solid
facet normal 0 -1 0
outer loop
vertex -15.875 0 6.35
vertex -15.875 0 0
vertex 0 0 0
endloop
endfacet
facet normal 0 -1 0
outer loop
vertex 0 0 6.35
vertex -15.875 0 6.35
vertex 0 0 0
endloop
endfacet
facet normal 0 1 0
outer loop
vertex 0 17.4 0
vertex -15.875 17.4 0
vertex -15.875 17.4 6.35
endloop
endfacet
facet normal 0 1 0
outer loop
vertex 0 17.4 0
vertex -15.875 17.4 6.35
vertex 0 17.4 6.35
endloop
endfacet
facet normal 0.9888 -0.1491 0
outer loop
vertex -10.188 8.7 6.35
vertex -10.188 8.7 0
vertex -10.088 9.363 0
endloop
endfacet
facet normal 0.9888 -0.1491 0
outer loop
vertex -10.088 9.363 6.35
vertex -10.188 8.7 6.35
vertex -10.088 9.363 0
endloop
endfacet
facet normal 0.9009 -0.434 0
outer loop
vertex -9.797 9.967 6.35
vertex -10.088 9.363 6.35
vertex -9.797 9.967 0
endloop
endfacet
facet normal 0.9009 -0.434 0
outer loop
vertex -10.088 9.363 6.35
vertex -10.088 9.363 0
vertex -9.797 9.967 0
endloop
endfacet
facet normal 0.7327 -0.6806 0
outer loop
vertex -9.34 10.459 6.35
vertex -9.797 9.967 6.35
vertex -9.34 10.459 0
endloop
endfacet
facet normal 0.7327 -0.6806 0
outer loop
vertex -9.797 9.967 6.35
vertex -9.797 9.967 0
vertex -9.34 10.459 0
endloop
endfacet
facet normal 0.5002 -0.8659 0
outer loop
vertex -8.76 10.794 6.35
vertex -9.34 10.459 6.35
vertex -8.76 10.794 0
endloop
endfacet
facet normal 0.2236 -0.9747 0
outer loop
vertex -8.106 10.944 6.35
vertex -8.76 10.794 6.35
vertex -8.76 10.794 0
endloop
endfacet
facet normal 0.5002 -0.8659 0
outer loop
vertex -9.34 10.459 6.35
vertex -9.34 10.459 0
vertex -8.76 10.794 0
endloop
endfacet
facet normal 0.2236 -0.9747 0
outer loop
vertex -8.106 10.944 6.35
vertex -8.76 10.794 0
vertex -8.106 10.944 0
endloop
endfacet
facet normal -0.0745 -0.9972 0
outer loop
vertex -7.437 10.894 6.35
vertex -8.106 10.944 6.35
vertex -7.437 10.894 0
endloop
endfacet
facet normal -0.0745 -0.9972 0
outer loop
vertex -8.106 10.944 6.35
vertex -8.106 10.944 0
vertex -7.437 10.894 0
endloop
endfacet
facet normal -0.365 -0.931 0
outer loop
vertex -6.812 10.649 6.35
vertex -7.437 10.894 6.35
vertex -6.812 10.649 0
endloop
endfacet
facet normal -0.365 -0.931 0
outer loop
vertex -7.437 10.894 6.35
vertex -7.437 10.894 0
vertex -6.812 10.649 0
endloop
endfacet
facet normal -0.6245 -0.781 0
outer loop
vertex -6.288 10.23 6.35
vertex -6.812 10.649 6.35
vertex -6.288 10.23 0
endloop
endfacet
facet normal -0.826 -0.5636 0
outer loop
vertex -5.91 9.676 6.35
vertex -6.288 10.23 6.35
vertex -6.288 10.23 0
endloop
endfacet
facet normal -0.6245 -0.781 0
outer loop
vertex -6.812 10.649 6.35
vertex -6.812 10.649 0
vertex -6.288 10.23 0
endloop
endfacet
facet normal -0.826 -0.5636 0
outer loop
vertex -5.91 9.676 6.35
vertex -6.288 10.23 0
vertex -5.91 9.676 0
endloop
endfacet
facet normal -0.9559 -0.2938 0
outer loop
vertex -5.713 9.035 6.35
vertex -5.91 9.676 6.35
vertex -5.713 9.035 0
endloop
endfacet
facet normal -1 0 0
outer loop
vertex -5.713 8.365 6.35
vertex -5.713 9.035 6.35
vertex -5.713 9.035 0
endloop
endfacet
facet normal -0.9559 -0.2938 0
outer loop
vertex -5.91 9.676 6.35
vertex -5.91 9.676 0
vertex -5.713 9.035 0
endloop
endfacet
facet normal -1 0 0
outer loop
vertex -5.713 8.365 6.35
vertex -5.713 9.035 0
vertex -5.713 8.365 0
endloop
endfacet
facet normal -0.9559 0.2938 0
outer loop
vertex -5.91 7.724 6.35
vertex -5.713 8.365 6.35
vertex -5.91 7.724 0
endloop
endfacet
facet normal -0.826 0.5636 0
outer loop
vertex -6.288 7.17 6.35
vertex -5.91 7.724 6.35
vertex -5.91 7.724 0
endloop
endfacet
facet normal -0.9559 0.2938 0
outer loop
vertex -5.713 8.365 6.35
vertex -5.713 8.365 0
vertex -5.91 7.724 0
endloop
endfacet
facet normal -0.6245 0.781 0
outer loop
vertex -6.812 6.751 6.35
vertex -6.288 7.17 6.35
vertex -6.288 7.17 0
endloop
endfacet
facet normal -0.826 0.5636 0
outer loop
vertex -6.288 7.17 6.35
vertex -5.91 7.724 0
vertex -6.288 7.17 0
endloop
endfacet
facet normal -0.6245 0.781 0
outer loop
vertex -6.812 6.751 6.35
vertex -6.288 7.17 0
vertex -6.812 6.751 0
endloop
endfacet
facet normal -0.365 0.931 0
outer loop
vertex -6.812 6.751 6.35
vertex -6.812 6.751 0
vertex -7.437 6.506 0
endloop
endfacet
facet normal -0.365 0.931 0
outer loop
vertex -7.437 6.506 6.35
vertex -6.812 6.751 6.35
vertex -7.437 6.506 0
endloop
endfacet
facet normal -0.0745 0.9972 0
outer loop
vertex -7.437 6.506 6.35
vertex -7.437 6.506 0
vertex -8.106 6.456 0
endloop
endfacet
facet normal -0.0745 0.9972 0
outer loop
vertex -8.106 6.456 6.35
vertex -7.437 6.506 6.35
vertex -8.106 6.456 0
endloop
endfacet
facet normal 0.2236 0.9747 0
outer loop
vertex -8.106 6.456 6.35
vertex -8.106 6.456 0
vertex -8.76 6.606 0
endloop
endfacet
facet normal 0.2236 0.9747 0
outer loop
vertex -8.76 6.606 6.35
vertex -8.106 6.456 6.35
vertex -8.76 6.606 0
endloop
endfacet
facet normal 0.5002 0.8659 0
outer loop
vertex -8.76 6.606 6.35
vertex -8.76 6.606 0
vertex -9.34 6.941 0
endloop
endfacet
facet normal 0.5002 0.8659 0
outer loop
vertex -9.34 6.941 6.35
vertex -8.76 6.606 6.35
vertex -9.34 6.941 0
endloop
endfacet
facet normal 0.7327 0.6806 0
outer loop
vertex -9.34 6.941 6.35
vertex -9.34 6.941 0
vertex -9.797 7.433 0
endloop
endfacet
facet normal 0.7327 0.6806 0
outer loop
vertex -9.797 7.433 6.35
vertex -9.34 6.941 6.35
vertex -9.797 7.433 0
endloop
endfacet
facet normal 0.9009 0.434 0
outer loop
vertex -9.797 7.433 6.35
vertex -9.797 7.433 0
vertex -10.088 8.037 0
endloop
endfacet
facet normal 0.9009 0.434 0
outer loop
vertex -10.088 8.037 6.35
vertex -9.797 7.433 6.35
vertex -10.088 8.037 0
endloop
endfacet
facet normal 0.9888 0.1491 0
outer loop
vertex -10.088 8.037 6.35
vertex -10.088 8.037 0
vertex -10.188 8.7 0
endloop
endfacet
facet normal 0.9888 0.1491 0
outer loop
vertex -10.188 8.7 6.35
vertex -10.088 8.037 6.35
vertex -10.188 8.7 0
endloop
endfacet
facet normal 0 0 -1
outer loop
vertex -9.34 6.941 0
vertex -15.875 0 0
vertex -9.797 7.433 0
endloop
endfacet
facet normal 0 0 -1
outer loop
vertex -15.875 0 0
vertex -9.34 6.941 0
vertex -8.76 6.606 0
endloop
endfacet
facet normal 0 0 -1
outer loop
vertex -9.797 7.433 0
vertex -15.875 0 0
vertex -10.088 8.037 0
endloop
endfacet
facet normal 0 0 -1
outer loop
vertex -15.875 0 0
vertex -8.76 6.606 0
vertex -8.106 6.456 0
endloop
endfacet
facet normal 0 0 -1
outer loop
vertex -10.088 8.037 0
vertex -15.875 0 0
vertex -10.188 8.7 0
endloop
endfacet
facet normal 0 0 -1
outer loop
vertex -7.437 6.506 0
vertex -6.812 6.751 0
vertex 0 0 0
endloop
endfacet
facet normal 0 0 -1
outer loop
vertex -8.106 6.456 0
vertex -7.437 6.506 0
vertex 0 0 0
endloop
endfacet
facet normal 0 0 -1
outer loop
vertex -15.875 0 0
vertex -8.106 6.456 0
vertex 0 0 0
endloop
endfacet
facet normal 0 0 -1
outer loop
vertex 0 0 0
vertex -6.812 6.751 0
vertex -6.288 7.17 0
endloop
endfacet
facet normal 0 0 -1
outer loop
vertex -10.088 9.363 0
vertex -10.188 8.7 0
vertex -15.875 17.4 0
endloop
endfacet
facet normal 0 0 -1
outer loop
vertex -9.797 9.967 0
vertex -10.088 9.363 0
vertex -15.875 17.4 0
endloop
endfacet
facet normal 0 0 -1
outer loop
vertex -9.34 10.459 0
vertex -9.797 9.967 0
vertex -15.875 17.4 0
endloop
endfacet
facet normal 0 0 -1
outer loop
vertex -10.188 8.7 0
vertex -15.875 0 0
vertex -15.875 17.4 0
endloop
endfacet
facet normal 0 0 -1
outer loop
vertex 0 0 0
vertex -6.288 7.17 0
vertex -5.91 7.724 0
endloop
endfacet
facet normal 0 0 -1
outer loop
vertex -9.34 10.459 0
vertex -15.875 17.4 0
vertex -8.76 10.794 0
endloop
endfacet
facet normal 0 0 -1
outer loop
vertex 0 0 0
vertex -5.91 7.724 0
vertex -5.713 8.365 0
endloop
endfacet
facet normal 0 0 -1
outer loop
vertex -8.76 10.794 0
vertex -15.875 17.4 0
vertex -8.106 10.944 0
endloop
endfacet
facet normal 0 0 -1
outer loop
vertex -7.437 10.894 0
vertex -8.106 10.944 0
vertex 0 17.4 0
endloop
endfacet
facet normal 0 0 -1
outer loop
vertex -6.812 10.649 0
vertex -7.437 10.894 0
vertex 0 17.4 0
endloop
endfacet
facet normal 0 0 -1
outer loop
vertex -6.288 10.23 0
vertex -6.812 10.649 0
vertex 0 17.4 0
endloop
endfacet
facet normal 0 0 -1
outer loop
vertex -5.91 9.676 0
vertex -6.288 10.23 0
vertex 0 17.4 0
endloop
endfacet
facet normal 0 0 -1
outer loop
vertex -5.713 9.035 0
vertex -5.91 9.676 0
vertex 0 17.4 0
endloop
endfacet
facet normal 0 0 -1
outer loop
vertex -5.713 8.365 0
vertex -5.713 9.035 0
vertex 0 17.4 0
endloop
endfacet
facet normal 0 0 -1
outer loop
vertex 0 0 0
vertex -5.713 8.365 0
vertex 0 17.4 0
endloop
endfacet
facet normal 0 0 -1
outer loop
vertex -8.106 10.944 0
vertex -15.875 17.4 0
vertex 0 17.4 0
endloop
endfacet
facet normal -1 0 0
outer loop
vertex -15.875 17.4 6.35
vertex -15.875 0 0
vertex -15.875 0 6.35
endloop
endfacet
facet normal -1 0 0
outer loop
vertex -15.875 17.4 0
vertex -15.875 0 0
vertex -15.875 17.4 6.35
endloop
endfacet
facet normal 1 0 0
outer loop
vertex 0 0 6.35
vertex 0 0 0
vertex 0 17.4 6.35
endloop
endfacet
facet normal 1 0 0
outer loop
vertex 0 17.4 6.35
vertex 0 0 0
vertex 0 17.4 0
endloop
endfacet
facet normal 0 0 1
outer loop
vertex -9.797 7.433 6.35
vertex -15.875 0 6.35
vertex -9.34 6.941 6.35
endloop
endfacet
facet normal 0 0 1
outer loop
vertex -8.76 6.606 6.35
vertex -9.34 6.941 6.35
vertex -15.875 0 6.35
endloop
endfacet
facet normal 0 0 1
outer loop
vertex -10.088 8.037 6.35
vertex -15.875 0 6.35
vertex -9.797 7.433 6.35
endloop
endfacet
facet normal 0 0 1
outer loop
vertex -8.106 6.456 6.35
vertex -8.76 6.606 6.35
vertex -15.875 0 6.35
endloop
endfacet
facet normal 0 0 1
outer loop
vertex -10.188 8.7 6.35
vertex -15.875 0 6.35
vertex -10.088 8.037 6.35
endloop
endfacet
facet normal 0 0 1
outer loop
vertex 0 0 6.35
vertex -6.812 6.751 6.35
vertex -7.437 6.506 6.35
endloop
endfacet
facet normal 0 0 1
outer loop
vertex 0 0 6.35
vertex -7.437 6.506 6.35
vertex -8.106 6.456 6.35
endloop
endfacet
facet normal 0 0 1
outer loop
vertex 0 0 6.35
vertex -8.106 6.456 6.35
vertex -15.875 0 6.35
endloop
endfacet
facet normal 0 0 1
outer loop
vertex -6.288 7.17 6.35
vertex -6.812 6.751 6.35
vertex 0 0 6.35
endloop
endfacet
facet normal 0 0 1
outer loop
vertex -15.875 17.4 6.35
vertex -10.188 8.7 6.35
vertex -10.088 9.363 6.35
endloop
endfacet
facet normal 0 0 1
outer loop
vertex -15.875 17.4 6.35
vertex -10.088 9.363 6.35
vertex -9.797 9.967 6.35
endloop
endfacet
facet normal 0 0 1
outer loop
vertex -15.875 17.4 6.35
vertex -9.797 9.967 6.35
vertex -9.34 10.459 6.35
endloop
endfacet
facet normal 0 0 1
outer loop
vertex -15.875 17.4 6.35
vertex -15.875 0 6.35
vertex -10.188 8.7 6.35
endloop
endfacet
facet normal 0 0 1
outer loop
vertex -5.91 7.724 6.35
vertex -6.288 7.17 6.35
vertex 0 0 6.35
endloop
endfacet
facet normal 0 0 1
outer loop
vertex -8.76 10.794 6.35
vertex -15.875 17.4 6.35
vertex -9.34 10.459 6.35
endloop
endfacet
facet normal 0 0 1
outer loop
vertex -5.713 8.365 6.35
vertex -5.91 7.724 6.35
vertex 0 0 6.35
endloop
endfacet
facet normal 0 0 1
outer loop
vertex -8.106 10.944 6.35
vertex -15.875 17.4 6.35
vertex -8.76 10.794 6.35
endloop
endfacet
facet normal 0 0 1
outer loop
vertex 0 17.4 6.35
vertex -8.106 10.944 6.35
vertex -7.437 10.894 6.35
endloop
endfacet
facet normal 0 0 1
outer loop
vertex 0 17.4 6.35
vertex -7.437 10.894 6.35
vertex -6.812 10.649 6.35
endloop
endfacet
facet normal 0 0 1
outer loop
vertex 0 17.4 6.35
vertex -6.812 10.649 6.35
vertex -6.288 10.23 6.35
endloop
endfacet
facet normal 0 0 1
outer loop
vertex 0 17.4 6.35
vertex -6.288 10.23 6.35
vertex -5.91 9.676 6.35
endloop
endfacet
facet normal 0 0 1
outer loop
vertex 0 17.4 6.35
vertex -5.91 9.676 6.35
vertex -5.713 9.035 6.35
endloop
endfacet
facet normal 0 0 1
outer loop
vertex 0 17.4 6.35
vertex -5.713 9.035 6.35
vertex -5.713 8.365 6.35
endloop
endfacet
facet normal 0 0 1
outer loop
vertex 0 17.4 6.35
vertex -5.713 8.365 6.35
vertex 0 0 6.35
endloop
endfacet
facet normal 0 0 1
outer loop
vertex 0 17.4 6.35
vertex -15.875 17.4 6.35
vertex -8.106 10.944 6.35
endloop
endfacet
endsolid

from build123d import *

# Parameters (mm, degrees)
SKETCH1_W                = 15.875
SKETCH1_H                = 17.4
BOSS_EXTRUDE1_DEPTH      = 6.35
M4_CLEARANCE_HOLE1_D     = 4.5
M4_CLEARANCE_HOLE1_DEPTH = 12.7
M4_CLEARANCE_HOLE1_TIP   = 1.351936393


with BuildPart() as part:
    # Sketch1 → Boss-Extrude1 (new body)
    with BuildSketch(Plane.XY):
        with Locations((-7.9375, 8.7)):
            Rectangle(SKETCH1_W, SKETCH1_H)
    extrude(amount=BOSS_EXTRUDE1_DEPTH)

    # M4 Clearance Hole1
    with Locations(Plane.XY.offset(6.35)):
        with Locations((-7.9375, 8.7)):
            Hole(M4_CLEARANCE_HOLE1_D / 2, depth=M4_CLEARANCE_HOLE1_DEPTH)
            with Locations((0, 0, -(M4_CLEARANCE_HOLE1_DEPTH + M4_CLEARANCE_HOLE1_TIP / 2))):  # 118° drill point
                Cone(0, M4_CLEARANCE_HOLE1_D / 2, M4_CLEARANCE_HOLE1_TIP, mode=Mode.SUBTRACT)


solid = part.part
